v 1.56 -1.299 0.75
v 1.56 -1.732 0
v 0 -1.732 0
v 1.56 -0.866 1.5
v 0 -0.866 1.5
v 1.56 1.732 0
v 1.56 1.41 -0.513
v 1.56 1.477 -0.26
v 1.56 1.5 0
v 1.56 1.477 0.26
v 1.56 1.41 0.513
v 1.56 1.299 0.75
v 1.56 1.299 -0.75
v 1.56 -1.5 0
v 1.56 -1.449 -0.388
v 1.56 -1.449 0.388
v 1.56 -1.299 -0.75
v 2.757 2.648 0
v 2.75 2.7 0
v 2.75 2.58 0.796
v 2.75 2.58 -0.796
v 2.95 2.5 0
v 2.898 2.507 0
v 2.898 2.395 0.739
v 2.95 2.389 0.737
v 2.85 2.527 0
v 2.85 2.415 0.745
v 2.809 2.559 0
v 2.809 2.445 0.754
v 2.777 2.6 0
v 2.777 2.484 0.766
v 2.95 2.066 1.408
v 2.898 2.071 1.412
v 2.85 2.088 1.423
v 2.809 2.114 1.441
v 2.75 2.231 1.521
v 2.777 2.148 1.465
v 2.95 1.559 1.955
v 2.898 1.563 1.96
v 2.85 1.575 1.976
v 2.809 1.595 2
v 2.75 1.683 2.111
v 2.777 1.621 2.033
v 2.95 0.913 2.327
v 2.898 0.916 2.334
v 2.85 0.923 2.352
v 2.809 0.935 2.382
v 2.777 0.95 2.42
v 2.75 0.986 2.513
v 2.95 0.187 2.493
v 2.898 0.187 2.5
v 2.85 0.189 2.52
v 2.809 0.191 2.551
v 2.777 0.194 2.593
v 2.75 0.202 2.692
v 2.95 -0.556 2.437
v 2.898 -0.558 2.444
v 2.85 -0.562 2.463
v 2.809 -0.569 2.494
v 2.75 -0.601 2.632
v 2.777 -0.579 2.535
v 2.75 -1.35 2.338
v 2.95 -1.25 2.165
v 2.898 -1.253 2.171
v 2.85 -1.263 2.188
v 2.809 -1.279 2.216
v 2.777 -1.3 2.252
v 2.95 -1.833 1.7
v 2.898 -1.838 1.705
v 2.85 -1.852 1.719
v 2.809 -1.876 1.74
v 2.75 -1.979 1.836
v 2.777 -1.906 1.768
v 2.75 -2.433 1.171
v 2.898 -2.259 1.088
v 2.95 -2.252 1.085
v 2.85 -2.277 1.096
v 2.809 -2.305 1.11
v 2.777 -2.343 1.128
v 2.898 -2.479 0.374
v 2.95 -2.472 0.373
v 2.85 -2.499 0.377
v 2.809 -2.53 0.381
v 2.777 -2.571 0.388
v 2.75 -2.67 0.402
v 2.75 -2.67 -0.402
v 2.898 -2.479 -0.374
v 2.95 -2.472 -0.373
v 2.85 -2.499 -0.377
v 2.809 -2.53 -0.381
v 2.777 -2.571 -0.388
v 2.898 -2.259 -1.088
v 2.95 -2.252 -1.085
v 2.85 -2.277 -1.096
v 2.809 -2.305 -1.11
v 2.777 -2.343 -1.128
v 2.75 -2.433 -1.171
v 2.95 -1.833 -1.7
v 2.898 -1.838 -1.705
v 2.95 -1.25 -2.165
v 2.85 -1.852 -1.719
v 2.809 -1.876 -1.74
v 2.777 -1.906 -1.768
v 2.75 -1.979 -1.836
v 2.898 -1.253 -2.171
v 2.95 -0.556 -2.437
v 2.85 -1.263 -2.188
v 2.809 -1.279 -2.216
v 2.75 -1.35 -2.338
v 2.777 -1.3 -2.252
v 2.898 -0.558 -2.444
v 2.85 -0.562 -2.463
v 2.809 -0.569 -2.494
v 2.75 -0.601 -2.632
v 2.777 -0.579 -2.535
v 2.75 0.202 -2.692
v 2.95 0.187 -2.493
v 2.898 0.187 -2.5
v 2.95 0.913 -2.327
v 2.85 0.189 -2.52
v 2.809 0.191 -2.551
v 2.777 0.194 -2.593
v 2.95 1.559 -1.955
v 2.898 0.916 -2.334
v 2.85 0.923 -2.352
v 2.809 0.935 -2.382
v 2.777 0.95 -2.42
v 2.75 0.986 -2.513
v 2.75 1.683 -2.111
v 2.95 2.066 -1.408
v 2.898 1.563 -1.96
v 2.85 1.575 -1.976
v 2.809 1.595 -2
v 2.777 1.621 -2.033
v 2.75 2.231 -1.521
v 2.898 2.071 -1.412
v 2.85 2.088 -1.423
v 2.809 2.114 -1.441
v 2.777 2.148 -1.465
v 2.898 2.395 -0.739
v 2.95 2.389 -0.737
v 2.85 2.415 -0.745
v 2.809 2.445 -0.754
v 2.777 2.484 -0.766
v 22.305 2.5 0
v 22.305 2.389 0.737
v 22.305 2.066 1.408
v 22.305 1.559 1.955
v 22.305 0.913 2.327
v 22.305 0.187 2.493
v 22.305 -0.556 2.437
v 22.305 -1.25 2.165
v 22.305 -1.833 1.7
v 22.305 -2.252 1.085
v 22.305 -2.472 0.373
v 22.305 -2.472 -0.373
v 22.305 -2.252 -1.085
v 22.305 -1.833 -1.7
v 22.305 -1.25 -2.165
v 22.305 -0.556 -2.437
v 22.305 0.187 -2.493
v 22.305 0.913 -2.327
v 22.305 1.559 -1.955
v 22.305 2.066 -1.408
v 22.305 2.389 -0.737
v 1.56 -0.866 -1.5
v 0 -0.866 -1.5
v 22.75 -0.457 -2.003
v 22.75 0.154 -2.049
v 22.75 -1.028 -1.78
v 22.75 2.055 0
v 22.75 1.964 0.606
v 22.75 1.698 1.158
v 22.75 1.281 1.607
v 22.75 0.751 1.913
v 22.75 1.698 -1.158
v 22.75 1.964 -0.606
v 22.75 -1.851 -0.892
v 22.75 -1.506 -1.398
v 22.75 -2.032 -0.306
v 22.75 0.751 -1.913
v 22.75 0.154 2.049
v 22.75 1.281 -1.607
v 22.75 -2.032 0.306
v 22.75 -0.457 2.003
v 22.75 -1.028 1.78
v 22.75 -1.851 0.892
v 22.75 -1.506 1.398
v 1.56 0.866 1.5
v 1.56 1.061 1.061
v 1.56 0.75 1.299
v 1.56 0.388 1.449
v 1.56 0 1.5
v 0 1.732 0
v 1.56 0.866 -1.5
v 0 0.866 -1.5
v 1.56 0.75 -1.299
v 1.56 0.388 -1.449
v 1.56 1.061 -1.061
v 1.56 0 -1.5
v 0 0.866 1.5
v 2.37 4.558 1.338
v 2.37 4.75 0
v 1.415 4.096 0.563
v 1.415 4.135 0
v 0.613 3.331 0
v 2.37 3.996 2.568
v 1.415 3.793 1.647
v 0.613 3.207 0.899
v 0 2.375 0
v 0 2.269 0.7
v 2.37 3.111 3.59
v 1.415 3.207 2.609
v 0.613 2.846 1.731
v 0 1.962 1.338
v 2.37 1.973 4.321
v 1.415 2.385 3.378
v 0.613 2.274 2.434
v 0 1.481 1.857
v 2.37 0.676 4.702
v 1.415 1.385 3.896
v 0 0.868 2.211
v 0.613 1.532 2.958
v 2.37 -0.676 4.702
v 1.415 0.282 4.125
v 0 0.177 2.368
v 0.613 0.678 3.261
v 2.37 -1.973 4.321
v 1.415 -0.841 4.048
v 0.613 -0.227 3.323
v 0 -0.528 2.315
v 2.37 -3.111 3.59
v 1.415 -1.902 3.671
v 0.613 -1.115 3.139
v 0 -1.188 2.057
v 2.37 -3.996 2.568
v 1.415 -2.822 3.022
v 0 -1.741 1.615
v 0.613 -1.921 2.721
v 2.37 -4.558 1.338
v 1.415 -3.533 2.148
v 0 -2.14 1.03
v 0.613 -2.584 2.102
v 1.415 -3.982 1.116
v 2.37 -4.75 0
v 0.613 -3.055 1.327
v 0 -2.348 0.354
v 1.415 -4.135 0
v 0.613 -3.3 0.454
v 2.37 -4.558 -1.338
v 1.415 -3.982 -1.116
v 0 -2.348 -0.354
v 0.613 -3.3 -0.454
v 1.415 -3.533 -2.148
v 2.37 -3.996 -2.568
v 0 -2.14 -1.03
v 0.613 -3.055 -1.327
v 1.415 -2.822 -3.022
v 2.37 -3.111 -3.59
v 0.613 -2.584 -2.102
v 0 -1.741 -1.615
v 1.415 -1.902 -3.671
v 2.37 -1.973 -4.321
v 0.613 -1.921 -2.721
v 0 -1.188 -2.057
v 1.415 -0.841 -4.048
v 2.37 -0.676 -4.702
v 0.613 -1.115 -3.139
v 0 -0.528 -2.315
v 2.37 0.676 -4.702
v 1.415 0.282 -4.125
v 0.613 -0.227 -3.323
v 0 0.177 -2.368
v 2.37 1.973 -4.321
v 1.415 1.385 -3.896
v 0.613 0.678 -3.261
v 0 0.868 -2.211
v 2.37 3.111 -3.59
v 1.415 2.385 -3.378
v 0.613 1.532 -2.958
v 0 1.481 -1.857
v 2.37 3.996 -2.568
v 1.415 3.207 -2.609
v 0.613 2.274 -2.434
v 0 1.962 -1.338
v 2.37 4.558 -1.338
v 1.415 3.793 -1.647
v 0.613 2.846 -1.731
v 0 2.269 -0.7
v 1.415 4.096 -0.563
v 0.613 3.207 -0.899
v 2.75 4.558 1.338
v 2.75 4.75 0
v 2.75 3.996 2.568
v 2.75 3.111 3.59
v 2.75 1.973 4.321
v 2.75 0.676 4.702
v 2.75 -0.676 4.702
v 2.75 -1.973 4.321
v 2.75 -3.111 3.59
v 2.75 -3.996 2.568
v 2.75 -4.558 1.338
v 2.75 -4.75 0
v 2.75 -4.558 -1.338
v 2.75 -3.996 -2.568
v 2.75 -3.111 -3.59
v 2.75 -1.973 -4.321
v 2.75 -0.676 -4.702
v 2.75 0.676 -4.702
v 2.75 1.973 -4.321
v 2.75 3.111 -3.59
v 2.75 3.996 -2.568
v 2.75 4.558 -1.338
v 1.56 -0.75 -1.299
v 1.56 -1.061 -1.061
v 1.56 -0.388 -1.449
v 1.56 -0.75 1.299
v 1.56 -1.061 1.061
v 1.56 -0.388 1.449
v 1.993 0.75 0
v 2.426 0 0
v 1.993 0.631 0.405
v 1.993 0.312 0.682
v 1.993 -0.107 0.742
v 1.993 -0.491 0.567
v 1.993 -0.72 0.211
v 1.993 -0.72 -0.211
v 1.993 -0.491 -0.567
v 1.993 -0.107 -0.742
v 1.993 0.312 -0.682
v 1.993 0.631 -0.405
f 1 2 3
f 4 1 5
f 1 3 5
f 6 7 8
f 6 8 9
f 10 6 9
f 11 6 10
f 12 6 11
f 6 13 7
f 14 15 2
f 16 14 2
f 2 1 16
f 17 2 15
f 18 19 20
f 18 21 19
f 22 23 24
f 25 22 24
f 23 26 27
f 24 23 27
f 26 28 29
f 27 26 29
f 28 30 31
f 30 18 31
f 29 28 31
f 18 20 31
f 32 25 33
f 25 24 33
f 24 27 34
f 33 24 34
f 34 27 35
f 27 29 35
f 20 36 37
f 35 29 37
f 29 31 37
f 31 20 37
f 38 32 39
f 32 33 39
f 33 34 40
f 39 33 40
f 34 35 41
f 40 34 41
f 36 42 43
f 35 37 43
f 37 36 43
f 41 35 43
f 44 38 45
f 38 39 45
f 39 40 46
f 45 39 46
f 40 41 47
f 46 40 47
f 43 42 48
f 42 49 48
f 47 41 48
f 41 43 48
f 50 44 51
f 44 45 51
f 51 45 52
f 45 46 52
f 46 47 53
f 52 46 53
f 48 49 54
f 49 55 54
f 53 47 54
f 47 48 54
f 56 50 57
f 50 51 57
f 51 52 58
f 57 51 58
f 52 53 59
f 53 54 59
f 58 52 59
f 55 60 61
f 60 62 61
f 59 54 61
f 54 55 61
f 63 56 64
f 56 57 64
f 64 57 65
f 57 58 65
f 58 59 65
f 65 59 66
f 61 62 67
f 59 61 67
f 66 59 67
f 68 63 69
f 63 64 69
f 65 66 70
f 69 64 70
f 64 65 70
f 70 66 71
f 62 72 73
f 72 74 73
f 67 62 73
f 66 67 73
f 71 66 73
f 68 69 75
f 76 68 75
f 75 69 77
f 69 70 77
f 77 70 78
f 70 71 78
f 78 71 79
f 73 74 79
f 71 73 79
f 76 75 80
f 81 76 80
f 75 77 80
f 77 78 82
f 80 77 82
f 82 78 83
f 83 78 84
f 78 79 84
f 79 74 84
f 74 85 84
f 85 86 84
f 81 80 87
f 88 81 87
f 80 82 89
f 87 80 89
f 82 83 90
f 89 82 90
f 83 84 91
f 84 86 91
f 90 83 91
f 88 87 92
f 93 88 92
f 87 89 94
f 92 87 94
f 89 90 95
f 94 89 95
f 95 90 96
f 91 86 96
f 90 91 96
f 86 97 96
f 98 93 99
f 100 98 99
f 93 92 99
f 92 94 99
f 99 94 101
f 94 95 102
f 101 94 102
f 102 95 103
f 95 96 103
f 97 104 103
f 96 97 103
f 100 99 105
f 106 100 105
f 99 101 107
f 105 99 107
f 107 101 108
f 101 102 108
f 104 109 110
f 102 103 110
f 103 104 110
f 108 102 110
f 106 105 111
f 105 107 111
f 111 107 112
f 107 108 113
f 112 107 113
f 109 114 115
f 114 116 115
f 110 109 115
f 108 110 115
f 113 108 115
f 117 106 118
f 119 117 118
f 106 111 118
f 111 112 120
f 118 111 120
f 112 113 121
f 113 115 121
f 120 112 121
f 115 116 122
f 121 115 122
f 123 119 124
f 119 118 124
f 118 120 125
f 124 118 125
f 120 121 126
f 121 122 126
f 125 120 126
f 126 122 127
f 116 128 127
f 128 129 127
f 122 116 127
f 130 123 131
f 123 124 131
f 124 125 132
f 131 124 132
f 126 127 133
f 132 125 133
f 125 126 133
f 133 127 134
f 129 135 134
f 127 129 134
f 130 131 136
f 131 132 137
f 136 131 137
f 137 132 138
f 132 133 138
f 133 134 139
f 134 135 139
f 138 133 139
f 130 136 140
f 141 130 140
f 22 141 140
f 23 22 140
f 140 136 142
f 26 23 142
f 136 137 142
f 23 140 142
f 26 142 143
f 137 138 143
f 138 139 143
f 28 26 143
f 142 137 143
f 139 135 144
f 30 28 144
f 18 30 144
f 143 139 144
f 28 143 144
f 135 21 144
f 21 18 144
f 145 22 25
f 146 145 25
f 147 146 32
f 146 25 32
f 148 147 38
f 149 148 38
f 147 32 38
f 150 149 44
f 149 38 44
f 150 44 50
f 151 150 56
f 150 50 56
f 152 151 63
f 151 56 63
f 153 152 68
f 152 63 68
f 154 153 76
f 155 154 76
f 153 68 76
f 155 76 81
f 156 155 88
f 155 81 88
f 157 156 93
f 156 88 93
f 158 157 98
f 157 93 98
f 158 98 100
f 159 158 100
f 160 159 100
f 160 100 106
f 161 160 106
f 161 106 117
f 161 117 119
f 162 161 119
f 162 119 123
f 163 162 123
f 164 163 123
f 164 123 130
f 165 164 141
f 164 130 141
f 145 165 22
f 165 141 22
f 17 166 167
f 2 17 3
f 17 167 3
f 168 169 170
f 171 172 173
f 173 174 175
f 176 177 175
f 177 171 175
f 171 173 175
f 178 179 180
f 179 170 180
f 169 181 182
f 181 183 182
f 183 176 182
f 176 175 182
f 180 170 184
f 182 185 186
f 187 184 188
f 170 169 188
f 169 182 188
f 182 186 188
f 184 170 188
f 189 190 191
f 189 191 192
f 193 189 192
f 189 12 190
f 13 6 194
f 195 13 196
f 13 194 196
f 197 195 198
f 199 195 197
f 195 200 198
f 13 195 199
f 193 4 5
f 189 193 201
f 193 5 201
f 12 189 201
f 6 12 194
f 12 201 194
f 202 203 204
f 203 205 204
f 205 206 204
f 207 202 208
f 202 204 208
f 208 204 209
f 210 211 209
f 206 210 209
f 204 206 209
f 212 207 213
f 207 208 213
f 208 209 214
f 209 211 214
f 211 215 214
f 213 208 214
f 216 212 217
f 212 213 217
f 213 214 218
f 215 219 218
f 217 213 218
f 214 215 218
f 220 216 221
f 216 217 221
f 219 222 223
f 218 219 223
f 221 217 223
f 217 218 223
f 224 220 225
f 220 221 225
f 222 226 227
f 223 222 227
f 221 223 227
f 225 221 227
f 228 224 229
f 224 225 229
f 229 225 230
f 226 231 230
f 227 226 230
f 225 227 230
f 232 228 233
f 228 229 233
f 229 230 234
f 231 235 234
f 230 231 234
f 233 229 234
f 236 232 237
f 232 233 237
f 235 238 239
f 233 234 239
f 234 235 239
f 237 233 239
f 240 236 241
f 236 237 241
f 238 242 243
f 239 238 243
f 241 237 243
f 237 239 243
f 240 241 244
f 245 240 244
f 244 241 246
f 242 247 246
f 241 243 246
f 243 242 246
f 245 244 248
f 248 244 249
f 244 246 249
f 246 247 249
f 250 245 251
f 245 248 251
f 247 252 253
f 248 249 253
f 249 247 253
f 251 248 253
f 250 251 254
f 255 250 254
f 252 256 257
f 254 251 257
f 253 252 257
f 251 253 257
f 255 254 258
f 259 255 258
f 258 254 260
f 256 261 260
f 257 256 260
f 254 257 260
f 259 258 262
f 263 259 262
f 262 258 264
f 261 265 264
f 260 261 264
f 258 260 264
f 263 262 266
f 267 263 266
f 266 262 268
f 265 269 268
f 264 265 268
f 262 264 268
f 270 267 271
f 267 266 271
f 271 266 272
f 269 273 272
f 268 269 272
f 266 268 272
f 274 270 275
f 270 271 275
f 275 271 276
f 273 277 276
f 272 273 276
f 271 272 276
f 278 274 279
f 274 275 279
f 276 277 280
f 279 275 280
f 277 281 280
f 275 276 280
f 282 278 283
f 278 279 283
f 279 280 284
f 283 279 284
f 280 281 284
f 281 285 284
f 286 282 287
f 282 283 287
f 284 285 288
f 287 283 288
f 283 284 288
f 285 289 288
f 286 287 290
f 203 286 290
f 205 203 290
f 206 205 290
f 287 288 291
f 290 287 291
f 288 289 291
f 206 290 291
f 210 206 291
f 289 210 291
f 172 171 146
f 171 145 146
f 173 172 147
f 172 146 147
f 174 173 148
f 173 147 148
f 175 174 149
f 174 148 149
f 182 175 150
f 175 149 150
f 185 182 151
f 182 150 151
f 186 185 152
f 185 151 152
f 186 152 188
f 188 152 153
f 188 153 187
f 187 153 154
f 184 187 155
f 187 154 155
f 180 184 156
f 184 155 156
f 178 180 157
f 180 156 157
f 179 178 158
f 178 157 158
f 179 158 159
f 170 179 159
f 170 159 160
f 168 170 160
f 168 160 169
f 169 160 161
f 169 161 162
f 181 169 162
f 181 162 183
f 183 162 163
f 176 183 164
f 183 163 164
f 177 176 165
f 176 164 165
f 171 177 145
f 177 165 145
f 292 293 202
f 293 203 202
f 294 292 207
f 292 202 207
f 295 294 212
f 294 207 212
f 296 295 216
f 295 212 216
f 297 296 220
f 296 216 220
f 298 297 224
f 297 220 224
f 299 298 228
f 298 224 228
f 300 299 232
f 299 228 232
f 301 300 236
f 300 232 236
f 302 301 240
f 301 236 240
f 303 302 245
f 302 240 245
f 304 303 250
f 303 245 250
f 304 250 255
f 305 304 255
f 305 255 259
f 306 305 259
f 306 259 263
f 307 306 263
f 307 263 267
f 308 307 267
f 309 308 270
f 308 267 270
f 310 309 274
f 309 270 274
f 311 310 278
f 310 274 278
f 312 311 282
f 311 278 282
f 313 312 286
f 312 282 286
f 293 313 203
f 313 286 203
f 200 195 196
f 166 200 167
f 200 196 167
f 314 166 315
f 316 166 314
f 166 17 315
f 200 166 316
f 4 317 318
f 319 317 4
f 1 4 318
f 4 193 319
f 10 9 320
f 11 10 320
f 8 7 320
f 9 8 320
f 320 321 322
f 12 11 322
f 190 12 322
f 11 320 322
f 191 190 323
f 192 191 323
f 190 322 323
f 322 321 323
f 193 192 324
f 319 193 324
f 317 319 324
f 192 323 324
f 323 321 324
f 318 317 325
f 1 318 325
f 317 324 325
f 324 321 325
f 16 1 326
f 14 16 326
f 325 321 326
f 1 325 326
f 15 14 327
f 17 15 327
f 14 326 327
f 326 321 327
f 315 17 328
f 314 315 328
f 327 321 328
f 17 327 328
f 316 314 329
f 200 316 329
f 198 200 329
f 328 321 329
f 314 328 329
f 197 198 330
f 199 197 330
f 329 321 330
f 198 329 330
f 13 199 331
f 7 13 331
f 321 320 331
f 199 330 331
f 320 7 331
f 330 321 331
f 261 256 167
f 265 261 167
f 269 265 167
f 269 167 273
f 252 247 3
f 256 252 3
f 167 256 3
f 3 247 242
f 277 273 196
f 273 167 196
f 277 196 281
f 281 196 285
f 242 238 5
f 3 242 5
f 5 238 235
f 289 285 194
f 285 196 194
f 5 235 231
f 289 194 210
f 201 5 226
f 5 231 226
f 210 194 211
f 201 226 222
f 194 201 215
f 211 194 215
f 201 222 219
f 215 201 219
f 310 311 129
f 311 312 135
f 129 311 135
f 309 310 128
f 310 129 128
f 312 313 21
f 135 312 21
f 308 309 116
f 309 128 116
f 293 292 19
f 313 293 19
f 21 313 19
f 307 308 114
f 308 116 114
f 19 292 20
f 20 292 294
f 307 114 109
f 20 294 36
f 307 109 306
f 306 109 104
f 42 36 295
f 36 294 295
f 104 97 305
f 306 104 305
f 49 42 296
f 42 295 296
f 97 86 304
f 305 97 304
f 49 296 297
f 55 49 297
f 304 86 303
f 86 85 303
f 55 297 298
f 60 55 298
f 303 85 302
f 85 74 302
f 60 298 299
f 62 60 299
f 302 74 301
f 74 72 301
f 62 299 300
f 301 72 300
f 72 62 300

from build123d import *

# Parameters (mm, degrees)
FILLET1_R   = 0.2
HEX_2_DEPTH = 1.56


with BuildPart() as part:
    # BodySke → BaseBody (revolve)
    with BuildSketch(Plane.XY):
        with BuildLine():
            Line((22.75, 0), (22.75, 2.055))
            Line((22.75, 2.055), (22.305, 2.5))
            Line((22.305, 2.5), (2.75, 2.5))
            Line((2.75, 2.5), (2.75, 4.75))
            Line((2.75, 4.75), (2.37, 4.75))
            ThreePointArc((2.37, 4.75), (0.992680215, 3.754414901), (0, 2.375))
            Line((0, 2.375), (0, 0))
            Line((0, 0), (22.75, 0))
        make_face()
    revolve(axis=Axis((0, 0, 0), (1, 0, 0)))

    # Fillet1
    fillet1_edges = [part.edges().sort_by_distance(p)[0] for p in [
        (2.75, -2.5, 0),
    ]]
    fillet(fillet1_edges, radius=FILLET1_R)

    # Sketch2 → PreBroach (revolve, cut)
    with BuildSketch(Plane.XY):
        Polygon((0, 1.5), (1.56, 1.5), (2.426025404, 0), (0, 0), align=None)
    revolve(axis=Axis((0, 0, 0), (1, 0, 0)), mode=Mode.SUBTRACT)

    # Sketch3 → Hex 2 (cut)
    with BuildSketch(Plane(origin=(0, 0, 0), x_dir=(0, 0, -1), z_dir=(1, 0, 0))):
        Polygon((-1.5, -0.866025404), (-1.5, 0.866025404), (0, 1.732050808), (1.5, 0.866025404), (1.5, -0.866025404), (0, -1.732050808), align=None)
    extrude(amount=HEX_2_DEPTH, mode=Mode.SUBTRACT)


solid = part.part
